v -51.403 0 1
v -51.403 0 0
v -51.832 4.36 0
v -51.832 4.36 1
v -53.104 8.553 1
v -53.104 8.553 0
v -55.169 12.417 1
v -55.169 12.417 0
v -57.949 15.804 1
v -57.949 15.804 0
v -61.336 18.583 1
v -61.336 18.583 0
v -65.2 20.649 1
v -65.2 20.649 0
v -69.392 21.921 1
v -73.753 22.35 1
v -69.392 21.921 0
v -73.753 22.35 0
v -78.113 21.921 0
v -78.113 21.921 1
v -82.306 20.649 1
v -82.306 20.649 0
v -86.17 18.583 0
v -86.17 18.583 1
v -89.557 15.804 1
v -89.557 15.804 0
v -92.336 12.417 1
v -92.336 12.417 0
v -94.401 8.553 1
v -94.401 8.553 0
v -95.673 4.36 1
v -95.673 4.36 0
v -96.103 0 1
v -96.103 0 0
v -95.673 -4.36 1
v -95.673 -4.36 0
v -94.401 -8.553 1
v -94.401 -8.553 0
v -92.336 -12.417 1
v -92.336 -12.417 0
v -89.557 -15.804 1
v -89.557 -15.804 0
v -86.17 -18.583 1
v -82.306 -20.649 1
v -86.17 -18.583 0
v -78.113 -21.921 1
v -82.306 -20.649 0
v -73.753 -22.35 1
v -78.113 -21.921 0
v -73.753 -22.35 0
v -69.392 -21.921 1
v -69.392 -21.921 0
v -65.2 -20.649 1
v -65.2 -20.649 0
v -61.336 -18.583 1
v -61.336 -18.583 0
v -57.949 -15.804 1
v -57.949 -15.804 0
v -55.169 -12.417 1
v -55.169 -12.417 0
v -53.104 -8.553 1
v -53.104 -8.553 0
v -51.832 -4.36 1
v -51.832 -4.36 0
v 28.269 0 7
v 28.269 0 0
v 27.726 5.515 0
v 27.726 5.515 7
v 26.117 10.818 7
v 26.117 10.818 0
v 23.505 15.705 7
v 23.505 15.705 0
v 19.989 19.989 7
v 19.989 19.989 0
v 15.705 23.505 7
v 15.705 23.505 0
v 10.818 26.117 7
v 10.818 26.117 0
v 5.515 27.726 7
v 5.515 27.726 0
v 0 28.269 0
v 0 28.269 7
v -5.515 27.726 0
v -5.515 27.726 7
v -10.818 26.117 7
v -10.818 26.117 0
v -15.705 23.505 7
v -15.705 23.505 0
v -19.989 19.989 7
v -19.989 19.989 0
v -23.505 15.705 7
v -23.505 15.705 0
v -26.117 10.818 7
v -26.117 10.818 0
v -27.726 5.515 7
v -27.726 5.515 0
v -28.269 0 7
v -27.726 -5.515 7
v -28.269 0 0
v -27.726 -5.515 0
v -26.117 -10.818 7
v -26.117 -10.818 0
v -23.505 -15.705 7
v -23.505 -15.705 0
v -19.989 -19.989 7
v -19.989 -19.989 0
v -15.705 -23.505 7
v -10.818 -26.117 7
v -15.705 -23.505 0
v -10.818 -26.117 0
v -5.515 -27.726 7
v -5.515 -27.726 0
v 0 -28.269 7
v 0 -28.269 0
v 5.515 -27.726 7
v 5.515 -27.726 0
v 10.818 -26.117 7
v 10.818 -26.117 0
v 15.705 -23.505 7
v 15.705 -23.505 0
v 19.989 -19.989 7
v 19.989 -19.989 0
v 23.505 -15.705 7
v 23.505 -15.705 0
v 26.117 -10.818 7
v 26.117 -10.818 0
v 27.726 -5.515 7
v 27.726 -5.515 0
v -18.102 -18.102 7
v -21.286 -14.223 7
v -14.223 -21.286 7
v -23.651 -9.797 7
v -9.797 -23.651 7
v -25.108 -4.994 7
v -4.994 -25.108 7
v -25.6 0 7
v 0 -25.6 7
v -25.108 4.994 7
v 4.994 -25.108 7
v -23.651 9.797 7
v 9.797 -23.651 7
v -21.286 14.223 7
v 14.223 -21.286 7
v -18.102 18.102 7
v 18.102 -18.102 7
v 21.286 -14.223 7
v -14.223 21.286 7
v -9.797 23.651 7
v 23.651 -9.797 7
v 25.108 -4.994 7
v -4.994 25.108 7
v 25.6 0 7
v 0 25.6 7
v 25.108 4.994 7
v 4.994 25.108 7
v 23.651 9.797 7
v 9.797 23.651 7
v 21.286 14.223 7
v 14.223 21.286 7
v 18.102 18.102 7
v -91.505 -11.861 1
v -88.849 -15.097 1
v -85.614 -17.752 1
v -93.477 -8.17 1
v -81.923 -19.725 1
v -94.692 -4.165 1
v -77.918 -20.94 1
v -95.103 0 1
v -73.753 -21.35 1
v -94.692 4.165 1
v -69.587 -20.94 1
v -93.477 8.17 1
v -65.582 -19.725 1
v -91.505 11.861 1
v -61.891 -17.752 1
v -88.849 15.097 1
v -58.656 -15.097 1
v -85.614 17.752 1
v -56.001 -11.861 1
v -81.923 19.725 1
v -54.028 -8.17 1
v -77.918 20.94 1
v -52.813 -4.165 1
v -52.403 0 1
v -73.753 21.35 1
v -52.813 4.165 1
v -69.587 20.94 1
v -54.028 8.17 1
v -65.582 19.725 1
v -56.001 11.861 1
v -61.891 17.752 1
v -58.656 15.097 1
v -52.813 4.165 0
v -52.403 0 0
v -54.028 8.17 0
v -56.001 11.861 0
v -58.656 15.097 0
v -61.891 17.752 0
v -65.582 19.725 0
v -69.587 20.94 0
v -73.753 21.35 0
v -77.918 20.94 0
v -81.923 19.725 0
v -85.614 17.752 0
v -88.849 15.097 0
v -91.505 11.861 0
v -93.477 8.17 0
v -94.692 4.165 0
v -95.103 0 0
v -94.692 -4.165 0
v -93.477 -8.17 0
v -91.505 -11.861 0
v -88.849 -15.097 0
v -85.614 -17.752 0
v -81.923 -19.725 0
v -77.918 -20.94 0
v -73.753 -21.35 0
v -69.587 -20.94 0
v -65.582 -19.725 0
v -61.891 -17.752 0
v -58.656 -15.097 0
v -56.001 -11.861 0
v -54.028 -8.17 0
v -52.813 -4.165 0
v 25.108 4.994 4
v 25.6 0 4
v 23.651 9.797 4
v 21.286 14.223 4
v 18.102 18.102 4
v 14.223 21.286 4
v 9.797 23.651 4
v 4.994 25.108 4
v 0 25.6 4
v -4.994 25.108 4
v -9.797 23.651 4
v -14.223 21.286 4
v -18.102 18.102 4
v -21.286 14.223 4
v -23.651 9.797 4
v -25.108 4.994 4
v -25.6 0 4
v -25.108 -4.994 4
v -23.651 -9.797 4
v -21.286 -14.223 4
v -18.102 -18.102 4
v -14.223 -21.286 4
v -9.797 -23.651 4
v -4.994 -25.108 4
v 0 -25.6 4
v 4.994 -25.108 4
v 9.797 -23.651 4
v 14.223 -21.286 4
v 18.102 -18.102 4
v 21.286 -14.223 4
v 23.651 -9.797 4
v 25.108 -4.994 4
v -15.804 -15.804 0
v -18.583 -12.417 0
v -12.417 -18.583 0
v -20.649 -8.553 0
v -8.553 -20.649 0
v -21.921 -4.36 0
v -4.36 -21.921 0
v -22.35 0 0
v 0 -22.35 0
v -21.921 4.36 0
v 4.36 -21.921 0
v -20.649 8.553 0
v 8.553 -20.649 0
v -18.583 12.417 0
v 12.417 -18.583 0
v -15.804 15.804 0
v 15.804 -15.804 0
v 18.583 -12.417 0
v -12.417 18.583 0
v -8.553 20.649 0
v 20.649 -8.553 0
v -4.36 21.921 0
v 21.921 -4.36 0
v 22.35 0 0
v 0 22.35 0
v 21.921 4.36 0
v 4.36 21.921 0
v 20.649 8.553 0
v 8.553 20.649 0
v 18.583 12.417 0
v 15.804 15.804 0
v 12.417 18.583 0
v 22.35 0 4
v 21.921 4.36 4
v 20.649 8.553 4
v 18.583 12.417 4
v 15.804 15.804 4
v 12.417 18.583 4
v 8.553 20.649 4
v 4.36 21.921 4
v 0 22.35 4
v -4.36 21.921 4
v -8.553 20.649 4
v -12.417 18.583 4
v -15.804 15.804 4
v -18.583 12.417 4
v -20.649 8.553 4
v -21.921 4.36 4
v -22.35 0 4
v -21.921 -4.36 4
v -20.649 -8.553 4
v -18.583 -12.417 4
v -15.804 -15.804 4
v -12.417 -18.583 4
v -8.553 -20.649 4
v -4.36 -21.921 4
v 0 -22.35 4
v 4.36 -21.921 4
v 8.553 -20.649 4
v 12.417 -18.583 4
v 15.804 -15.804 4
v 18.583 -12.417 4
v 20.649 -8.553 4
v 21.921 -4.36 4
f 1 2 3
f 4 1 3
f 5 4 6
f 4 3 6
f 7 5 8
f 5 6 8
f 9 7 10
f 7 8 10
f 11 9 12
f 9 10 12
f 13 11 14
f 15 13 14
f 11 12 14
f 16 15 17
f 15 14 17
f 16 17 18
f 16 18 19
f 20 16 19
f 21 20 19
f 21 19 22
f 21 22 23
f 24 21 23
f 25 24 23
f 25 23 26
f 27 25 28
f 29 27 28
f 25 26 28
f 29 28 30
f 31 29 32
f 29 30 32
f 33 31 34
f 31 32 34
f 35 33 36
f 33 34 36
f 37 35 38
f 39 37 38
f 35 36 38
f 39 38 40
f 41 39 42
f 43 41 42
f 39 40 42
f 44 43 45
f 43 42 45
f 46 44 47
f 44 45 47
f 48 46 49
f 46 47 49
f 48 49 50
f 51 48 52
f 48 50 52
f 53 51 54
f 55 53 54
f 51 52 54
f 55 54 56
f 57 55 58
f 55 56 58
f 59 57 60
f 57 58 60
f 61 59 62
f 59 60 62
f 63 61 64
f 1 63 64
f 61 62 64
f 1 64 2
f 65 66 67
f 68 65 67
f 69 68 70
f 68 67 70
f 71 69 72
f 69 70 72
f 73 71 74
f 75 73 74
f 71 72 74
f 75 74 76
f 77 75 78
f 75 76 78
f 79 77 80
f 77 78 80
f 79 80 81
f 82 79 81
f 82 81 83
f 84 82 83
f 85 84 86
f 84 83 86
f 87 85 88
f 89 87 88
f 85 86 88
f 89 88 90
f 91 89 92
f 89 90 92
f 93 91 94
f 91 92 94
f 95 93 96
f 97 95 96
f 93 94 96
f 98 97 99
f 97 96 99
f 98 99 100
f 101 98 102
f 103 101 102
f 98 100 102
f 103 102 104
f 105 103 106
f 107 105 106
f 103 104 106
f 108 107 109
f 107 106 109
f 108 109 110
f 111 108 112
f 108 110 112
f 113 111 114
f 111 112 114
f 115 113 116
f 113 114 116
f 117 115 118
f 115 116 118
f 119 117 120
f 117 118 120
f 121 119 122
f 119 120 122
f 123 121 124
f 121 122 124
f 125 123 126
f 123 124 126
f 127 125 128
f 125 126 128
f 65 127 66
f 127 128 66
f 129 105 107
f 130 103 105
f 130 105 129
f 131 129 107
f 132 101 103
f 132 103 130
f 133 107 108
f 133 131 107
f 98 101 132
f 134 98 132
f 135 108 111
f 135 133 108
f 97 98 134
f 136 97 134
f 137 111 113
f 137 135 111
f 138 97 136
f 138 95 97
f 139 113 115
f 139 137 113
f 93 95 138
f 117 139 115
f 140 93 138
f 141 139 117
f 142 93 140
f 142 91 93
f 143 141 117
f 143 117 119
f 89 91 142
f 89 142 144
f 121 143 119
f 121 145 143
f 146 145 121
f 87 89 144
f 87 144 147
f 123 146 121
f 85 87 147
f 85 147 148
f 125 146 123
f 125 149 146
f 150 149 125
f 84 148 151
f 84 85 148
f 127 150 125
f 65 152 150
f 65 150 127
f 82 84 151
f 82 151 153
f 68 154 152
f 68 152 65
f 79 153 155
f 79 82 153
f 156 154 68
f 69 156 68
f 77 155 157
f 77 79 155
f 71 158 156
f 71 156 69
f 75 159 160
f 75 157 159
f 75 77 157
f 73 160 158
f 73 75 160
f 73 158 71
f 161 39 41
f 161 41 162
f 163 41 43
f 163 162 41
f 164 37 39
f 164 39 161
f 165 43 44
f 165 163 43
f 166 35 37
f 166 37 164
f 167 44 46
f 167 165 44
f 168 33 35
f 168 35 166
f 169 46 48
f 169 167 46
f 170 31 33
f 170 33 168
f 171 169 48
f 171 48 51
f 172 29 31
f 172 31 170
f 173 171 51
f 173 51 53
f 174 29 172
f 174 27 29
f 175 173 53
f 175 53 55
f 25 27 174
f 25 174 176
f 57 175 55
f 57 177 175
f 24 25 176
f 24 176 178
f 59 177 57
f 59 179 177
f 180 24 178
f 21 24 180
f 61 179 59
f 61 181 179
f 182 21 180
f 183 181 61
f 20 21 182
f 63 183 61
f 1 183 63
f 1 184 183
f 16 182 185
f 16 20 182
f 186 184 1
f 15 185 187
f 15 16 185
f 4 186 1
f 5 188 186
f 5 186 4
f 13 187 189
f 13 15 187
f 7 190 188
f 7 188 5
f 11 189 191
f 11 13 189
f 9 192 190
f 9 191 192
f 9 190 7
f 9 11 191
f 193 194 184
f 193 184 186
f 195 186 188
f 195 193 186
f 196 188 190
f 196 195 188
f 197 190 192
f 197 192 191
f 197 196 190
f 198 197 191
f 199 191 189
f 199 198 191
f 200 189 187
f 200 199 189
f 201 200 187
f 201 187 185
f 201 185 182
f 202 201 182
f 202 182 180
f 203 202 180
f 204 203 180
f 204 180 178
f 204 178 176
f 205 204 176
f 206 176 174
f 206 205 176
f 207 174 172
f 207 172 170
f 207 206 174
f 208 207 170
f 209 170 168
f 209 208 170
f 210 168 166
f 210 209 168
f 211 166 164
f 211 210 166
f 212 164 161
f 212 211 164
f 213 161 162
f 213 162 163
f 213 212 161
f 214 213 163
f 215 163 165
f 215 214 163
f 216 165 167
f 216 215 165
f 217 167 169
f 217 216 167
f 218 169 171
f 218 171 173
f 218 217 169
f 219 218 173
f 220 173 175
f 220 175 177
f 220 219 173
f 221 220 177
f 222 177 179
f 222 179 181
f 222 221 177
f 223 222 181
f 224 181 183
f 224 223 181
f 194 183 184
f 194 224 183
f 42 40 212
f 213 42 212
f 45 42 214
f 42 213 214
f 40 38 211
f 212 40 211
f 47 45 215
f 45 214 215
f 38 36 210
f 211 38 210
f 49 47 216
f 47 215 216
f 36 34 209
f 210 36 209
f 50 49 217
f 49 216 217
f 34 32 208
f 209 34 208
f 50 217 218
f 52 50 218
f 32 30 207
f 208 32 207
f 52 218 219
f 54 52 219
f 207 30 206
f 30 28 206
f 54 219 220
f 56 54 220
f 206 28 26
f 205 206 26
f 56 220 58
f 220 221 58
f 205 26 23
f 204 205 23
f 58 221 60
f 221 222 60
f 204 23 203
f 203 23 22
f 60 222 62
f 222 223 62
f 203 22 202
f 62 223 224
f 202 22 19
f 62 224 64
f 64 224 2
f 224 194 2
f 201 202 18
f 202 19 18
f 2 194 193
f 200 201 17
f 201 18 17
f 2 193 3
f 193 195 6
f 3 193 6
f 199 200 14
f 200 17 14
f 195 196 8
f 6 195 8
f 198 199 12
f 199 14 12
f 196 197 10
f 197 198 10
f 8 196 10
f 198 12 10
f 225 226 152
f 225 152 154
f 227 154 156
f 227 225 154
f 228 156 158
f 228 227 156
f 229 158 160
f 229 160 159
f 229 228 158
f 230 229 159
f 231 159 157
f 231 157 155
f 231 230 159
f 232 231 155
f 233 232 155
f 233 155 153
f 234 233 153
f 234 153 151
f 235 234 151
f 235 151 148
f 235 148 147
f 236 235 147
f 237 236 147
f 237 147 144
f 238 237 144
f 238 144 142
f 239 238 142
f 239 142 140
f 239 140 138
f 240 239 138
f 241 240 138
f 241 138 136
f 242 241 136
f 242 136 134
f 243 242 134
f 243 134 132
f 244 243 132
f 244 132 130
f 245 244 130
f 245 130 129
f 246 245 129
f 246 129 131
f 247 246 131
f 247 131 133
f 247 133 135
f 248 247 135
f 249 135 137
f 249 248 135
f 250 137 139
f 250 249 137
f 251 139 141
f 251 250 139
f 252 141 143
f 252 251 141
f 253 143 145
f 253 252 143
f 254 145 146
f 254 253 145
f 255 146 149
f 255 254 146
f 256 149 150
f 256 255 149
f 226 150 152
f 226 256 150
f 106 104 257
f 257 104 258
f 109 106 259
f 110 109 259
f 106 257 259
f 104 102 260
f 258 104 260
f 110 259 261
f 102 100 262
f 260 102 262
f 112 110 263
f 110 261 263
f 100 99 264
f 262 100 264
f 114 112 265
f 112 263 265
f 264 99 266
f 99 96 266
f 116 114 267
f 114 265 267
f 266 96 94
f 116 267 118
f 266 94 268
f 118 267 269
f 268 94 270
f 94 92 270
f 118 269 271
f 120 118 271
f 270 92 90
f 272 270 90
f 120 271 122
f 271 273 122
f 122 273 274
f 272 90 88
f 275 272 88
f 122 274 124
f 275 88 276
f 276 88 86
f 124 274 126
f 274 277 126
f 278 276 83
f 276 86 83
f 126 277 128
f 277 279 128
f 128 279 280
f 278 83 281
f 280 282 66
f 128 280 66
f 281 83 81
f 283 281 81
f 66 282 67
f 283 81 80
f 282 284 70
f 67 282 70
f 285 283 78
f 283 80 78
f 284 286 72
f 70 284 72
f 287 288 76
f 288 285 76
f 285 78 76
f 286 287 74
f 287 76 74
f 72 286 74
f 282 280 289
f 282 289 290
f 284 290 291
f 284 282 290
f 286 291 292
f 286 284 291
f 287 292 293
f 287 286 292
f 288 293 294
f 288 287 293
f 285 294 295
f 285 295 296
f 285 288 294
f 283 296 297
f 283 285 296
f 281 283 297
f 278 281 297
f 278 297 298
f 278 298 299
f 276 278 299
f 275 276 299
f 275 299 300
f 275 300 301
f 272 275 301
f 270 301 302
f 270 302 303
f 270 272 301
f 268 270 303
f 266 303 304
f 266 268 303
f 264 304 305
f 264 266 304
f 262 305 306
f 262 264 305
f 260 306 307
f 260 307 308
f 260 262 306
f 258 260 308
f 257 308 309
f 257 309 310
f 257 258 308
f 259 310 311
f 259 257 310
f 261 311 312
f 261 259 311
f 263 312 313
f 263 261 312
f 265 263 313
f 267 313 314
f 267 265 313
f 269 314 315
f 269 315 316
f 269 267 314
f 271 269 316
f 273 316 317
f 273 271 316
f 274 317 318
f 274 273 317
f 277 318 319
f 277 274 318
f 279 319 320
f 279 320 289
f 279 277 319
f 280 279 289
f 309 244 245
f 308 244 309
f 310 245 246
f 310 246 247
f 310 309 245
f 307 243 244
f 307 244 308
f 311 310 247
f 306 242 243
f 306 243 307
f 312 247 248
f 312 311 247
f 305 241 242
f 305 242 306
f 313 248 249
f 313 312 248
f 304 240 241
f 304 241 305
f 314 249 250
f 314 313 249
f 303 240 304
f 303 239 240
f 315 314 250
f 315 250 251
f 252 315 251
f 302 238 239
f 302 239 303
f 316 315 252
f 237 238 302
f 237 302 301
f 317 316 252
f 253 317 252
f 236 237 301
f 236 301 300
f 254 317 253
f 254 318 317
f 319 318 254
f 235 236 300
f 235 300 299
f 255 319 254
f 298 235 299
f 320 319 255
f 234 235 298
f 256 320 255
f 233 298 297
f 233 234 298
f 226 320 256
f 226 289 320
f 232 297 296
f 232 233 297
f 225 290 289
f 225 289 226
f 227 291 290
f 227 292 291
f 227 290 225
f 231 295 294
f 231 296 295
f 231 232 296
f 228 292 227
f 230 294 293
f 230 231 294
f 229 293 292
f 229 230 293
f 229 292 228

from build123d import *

# Parameters (mm, degrees)
F0_R     = 25.6
F0_R_2   = 22.35
F1_DEPTH = 4
F0_R_3   = 28.26882
F2_DEPTH = 7
F0_R_4   = 21.35
F3_DEPTH = 1


with BuildPart() as f1:
    # F0 (on Top) → F1 (new body)
    with BuildSketch(Plane.XY):
        Circle(F0_R)
        Circle(F0_R_2, mode=Mode.SUBTRACT)
    extrude(amount=F1_DEPTH)

    # F0 (on Top) → F2 (join)
    with BuildSketch(Plane.XY):
        Circle(F0_R_3)
        Circle(F0_R, mode=Mode.SUBTRACT)
    extrude(amount=F2_DEPTH)


with BuildPart() as f3:
    # F0 (on Top) → F3 (new body)
    with BuildSketch(Plane.XY):
        with Locations((-73.752664, 0)):
            Circle(F0_R_2)
        with Locations((-73.752664, 0)):
            Circle(F0_R_4, mode=Mode.SUBTRACT)
    extrude(amount=F3_DEPTH)


solid = Compound([f1.part, f3.part])
